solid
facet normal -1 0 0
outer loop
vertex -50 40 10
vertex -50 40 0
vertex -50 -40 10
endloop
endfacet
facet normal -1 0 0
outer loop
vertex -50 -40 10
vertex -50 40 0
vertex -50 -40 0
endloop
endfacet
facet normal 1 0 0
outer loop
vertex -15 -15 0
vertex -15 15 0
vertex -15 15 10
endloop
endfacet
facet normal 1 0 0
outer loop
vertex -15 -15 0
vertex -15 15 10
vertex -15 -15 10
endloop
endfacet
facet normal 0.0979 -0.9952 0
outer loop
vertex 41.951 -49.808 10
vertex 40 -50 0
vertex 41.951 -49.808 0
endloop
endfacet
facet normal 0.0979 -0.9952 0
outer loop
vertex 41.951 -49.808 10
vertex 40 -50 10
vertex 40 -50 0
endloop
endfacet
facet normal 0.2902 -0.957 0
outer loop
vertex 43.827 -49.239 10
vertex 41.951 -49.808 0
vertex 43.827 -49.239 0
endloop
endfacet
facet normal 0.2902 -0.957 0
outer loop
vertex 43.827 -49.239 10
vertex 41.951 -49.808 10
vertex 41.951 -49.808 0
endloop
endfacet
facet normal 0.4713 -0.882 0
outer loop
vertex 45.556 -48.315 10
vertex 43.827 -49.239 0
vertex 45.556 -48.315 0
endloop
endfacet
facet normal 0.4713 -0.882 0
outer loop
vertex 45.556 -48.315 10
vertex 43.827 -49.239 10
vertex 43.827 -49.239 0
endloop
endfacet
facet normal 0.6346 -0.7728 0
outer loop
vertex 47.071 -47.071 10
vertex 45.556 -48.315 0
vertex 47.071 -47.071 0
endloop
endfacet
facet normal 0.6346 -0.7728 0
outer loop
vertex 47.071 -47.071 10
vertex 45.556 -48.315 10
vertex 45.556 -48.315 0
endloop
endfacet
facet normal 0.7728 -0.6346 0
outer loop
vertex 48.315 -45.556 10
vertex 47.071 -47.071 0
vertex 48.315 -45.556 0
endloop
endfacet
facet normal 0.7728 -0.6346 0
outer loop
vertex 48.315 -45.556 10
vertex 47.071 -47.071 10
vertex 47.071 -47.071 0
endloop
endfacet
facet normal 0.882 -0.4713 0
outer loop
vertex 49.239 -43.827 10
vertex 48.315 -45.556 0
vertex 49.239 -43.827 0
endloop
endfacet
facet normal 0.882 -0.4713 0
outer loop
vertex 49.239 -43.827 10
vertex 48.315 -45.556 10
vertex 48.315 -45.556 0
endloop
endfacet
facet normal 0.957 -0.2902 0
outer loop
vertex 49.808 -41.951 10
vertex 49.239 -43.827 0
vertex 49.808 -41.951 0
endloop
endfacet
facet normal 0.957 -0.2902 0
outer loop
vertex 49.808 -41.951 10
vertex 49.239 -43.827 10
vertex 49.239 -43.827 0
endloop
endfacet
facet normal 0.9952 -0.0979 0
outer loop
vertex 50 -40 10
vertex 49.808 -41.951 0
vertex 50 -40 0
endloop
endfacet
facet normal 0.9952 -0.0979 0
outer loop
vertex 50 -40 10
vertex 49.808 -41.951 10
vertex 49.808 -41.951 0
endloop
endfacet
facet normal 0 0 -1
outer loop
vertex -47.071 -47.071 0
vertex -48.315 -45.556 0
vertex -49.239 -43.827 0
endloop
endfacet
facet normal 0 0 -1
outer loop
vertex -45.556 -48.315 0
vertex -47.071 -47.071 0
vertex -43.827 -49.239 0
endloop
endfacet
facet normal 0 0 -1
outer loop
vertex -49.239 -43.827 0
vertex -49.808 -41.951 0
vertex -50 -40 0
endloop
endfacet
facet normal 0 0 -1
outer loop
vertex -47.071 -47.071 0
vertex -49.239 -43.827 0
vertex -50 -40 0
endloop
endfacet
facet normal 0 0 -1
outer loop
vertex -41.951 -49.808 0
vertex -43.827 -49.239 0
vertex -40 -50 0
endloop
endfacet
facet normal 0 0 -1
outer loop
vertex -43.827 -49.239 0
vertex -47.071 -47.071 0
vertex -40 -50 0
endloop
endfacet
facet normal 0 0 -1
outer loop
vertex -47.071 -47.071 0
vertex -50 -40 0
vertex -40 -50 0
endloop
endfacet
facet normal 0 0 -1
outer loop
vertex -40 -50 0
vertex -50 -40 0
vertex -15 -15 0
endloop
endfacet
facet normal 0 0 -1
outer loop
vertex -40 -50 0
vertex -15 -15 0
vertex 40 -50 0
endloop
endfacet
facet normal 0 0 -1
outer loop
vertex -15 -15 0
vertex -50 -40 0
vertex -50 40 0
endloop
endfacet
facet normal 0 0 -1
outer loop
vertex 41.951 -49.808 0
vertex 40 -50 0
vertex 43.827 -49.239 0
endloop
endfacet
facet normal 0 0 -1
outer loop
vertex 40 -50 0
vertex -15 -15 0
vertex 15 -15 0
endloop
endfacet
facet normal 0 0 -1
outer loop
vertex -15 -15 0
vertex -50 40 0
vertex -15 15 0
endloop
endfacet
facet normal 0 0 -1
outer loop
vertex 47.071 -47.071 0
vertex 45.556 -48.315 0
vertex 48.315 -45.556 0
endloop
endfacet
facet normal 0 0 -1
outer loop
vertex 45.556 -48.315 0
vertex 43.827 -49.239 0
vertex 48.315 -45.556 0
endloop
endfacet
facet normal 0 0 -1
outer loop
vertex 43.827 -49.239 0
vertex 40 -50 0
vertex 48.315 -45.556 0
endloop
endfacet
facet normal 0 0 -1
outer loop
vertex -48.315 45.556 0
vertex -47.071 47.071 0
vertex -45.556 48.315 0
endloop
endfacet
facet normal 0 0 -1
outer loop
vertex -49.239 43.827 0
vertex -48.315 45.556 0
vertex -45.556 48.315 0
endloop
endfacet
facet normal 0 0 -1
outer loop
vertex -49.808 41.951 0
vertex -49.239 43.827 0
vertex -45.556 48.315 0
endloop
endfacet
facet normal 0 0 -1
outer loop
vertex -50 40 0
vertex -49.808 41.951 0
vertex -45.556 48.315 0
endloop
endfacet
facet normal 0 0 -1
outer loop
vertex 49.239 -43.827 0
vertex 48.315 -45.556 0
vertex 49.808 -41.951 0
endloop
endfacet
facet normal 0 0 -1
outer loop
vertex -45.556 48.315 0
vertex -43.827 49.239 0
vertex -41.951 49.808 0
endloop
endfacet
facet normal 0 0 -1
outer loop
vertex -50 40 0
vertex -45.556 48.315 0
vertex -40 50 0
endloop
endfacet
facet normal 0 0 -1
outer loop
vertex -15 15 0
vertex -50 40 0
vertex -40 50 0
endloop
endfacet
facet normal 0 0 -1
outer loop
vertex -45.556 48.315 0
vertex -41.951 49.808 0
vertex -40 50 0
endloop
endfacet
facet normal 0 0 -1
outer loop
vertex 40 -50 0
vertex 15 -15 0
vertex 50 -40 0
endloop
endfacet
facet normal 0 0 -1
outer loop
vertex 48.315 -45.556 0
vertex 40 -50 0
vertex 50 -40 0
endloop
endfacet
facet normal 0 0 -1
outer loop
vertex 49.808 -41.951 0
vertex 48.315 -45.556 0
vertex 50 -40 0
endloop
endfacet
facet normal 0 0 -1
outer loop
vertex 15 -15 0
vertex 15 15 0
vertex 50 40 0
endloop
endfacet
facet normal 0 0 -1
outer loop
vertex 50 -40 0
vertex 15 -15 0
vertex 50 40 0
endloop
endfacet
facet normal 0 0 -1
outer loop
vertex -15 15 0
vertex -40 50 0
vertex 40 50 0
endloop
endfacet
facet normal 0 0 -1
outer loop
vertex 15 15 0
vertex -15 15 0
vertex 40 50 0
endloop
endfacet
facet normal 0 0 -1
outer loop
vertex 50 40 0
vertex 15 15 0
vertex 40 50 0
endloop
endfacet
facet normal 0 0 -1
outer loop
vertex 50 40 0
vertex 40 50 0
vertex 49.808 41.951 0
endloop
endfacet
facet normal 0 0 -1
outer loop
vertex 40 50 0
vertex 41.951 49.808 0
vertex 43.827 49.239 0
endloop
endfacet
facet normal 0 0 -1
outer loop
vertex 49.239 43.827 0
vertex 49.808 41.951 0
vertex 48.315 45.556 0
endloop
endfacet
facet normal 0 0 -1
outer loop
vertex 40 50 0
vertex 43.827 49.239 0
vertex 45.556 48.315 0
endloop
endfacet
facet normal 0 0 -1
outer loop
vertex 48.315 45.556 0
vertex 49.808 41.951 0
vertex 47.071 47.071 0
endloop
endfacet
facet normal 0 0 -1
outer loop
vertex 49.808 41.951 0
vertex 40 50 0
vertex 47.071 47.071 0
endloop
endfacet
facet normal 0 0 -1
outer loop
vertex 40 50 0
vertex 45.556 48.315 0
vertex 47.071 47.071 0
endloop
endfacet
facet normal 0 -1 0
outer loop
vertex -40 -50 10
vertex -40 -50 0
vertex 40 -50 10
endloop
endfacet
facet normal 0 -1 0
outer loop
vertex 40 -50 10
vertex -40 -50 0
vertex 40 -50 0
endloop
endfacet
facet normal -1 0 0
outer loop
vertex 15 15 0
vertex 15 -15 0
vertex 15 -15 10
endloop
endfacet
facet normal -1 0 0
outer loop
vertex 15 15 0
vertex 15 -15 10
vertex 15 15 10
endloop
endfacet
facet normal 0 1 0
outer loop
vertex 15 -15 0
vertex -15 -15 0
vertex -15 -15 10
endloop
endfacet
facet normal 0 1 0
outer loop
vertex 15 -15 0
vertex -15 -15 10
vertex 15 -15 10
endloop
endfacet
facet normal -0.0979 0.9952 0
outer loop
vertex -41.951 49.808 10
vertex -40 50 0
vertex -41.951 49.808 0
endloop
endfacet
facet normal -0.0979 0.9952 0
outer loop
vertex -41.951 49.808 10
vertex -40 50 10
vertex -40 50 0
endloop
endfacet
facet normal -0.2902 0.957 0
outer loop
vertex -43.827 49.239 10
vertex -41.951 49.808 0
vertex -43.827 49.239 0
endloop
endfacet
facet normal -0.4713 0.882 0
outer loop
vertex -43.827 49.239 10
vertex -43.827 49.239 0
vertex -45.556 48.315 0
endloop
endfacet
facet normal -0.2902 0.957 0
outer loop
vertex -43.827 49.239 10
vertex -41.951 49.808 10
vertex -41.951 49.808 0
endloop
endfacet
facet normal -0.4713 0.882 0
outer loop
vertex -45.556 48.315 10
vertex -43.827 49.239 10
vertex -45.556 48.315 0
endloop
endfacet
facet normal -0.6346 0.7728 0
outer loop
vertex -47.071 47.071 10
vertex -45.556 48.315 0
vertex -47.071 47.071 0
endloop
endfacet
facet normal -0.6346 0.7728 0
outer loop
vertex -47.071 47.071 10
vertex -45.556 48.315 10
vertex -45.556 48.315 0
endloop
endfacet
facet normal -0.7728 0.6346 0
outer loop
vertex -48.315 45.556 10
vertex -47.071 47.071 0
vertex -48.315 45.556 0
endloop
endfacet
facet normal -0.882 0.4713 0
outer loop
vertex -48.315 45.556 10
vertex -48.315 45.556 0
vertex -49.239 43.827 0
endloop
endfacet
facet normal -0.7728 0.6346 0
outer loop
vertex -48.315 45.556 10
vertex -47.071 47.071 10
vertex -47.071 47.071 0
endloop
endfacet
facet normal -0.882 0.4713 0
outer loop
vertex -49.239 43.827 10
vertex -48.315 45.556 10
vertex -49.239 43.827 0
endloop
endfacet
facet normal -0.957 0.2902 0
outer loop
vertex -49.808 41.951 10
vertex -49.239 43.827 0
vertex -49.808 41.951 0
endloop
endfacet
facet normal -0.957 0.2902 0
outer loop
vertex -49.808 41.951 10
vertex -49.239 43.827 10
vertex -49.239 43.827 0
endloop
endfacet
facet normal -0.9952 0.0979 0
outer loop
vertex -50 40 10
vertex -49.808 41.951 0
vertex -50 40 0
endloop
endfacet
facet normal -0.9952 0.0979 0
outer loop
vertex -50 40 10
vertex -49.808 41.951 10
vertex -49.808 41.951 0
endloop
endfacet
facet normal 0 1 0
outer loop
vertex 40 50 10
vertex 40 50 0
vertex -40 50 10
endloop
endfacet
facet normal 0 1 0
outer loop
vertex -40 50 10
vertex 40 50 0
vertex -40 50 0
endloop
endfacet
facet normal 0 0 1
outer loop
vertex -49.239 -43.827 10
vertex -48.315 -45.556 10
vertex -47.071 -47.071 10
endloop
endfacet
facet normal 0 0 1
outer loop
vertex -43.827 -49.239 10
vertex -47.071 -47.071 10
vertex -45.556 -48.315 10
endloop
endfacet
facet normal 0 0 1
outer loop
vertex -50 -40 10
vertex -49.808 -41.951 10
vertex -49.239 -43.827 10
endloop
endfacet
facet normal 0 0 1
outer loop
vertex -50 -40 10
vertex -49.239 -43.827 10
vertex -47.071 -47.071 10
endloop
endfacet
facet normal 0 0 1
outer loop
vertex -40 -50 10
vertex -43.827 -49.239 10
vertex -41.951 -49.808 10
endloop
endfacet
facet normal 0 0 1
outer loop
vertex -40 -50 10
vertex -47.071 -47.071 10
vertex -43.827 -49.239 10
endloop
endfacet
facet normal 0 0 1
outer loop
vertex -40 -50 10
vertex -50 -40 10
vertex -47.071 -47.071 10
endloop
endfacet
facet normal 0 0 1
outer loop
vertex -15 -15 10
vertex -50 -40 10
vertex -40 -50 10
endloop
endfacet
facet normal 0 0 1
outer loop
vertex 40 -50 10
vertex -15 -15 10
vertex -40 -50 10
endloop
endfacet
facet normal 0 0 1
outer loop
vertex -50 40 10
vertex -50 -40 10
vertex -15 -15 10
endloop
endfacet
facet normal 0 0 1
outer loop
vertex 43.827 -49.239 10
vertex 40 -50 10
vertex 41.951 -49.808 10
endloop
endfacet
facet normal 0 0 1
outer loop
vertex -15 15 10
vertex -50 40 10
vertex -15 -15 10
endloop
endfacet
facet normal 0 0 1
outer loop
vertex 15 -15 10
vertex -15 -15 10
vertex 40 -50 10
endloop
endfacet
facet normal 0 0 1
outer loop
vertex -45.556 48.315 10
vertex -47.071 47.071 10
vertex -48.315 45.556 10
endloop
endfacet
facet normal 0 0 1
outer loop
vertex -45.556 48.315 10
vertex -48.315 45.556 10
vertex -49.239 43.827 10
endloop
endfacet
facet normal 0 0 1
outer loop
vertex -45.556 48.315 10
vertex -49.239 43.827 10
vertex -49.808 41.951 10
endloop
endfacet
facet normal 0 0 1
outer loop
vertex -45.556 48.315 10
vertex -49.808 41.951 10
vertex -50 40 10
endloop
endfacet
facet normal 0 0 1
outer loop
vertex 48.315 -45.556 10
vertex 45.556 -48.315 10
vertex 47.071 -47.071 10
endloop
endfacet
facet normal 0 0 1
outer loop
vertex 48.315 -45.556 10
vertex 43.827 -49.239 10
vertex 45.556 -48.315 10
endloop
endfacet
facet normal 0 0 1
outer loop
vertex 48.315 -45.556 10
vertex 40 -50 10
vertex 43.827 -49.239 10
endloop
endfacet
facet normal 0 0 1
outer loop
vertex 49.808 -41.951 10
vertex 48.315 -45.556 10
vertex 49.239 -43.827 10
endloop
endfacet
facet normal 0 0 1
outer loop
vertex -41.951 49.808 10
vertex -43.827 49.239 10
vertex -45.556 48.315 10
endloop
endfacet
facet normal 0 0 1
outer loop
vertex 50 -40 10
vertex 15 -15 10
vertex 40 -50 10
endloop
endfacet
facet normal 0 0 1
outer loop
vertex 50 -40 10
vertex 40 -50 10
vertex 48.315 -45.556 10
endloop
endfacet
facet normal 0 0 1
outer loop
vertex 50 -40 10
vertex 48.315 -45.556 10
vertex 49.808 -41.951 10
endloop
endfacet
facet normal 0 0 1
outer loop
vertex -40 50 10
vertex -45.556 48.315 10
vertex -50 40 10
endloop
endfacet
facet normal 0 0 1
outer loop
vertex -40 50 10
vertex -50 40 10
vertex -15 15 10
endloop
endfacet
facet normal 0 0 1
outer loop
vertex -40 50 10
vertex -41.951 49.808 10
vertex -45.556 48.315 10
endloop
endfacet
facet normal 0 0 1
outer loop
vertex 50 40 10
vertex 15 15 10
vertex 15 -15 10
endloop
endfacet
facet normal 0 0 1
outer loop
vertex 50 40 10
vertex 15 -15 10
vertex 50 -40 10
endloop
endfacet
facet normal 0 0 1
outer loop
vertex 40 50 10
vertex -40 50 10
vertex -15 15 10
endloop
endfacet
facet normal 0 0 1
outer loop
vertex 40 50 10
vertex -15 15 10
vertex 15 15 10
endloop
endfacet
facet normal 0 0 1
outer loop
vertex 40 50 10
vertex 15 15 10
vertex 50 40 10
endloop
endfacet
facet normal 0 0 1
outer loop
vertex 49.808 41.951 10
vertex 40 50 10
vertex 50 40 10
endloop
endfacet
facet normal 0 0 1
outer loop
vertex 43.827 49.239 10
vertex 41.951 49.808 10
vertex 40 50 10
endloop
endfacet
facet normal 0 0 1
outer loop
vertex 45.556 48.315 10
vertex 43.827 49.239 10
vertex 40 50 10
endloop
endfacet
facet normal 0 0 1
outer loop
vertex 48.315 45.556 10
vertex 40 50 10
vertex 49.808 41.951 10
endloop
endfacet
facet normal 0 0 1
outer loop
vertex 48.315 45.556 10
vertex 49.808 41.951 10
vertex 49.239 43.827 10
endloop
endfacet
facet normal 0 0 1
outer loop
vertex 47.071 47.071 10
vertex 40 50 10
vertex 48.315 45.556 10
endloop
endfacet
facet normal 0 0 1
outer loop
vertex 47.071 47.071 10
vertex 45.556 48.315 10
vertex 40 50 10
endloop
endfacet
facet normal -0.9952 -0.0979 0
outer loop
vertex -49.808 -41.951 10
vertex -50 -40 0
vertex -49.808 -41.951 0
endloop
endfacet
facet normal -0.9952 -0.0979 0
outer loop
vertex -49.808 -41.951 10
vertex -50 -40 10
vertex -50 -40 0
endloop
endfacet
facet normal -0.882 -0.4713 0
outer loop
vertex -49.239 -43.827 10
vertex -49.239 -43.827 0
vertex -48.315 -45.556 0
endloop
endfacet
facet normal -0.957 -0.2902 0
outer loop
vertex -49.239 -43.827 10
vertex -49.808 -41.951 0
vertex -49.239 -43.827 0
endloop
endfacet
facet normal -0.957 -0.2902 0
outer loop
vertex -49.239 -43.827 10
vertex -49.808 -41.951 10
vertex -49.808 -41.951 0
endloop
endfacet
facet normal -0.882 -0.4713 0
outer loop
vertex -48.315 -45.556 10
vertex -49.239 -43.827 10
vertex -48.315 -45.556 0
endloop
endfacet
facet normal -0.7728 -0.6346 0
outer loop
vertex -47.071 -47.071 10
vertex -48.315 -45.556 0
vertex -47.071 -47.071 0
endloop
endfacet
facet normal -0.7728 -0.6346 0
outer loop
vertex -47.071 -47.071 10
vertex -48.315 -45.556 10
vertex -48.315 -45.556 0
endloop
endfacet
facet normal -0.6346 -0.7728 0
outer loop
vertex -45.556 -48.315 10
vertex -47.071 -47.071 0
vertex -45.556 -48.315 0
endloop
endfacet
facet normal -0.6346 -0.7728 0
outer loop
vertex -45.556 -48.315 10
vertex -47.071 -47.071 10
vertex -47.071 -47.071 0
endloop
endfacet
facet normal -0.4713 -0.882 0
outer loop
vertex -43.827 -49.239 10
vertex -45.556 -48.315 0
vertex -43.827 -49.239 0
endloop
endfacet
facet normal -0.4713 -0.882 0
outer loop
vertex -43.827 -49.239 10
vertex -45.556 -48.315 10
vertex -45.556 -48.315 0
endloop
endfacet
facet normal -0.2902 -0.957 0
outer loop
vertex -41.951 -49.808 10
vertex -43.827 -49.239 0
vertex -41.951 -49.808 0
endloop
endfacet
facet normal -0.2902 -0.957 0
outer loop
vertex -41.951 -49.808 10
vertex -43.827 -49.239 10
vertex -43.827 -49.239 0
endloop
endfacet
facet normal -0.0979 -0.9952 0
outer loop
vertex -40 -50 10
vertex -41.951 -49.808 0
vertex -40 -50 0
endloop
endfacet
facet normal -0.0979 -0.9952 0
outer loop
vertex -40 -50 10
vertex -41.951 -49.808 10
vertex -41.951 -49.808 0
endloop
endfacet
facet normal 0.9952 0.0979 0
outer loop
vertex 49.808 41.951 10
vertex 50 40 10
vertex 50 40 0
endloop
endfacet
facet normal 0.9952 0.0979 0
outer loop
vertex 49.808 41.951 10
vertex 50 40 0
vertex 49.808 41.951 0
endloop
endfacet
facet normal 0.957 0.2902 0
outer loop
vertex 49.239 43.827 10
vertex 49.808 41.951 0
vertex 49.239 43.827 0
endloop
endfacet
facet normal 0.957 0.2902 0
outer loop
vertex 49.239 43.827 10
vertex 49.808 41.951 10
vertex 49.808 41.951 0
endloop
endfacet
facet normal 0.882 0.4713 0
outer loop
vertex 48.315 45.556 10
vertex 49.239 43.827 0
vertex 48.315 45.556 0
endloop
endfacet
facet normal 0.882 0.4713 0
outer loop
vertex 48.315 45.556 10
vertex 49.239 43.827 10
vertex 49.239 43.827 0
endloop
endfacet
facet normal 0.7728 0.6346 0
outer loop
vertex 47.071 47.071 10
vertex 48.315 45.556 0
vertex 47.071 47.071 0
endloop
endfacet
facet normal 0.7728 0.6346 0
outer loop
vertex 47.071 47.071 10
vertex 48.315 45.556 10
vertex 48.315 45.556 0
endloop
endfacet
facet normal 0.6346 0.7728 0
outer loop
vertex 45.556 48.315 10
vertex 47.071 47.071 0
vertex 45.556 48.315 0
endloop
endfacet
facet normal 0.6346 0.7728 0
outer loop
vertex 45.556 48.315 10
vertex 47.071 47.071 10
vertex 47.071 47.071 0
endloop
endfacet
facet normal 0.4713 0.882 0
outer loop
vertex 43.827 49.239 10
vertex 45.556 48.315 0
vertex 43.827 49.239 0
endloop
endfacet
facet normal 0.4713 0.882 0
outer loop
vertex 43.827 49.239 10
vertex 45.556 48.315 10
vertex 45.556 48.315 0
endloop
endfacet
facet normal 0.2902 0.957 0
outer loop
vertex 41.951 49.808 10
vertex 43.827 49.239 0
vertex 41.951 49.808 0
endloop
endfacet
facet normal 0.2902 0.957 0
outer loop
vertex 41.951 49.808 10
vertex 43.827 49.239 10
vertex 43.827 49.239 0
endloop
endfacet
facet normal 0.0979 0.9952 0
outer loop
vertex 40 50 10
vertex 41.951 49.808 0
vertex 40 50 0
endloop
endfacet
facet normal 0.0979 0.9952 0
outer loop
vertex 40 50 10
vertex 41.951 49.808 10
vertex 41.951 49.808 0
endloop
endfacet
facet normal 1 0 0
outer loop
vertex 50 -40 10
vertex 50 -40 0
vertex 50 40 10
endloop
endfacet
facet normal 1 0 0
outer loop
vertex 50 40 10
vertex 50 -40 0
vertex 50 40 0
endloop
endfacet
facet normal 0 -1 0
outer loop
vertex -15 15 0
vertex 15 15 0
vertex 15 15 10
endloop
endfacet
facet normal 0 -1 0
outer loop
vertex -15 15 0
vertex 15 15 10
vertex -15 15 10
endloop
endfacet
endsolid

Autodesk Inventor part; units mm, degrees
ref_plane "YZ Plane" through (0, 0, 0) normal (1, 0, 0) x (0, 1, 0)
ref_plane "XZ Plane" through (0, 0, 0) normal (0, 1, 0) x (-1, 0, 0)
ref_plane "XY Plane" through (0, 0, 0) normal (0, 0, 1) x (1, 0, 0)
sketch "Esboço1" plane through (0, 0, 0) normal (0, 0, 1) x (1, 0, 0)
  line L0 (-50, -50) -> (50, -50)
  line L1 (50, -50) -> (50, 50)
  line L2 (50, 50) -> (-50, 50)
  line L3 (-50, 50) -> (-50, -50)
  line L4 (-50, -50) -> (50, 50) construction
  line L5 (50, -50) -> (-50, 50) construction
  line L6 (-15, -15) -> (15, -15)
  line L7 (15, -15) -> (15, 15)
  line L8 (15, 15) -> (-15, 15)
  line L9 (-15, 15) -> (-15, -15)
  line L10 (-15, -15) -> (15, 15) construction
  line L11 (15, -15) -> (-15, 15) construction
  point P0 (0, 0)
  dimension "d0" = 100
  dimension "d1" = 100
  dimension "d2" = 30
  dimension "d3" = 30
extrude "Extrusão1" add sketch "Esboço1" along normal blind 10
fillet "Arredondamento1" radius 10 1 edges at (50, 50, 5)
fillet "Arredondamento2" radius 10 1 edges at (-50, 50, 5)
fillet "Arredondamento3" radius 10 1 edges at (50, -50, 5)
fillet "Arredondamento4" radius 10 1 edges at (-50, -50, 5)
properties part number "placa_furo_quadrado"
